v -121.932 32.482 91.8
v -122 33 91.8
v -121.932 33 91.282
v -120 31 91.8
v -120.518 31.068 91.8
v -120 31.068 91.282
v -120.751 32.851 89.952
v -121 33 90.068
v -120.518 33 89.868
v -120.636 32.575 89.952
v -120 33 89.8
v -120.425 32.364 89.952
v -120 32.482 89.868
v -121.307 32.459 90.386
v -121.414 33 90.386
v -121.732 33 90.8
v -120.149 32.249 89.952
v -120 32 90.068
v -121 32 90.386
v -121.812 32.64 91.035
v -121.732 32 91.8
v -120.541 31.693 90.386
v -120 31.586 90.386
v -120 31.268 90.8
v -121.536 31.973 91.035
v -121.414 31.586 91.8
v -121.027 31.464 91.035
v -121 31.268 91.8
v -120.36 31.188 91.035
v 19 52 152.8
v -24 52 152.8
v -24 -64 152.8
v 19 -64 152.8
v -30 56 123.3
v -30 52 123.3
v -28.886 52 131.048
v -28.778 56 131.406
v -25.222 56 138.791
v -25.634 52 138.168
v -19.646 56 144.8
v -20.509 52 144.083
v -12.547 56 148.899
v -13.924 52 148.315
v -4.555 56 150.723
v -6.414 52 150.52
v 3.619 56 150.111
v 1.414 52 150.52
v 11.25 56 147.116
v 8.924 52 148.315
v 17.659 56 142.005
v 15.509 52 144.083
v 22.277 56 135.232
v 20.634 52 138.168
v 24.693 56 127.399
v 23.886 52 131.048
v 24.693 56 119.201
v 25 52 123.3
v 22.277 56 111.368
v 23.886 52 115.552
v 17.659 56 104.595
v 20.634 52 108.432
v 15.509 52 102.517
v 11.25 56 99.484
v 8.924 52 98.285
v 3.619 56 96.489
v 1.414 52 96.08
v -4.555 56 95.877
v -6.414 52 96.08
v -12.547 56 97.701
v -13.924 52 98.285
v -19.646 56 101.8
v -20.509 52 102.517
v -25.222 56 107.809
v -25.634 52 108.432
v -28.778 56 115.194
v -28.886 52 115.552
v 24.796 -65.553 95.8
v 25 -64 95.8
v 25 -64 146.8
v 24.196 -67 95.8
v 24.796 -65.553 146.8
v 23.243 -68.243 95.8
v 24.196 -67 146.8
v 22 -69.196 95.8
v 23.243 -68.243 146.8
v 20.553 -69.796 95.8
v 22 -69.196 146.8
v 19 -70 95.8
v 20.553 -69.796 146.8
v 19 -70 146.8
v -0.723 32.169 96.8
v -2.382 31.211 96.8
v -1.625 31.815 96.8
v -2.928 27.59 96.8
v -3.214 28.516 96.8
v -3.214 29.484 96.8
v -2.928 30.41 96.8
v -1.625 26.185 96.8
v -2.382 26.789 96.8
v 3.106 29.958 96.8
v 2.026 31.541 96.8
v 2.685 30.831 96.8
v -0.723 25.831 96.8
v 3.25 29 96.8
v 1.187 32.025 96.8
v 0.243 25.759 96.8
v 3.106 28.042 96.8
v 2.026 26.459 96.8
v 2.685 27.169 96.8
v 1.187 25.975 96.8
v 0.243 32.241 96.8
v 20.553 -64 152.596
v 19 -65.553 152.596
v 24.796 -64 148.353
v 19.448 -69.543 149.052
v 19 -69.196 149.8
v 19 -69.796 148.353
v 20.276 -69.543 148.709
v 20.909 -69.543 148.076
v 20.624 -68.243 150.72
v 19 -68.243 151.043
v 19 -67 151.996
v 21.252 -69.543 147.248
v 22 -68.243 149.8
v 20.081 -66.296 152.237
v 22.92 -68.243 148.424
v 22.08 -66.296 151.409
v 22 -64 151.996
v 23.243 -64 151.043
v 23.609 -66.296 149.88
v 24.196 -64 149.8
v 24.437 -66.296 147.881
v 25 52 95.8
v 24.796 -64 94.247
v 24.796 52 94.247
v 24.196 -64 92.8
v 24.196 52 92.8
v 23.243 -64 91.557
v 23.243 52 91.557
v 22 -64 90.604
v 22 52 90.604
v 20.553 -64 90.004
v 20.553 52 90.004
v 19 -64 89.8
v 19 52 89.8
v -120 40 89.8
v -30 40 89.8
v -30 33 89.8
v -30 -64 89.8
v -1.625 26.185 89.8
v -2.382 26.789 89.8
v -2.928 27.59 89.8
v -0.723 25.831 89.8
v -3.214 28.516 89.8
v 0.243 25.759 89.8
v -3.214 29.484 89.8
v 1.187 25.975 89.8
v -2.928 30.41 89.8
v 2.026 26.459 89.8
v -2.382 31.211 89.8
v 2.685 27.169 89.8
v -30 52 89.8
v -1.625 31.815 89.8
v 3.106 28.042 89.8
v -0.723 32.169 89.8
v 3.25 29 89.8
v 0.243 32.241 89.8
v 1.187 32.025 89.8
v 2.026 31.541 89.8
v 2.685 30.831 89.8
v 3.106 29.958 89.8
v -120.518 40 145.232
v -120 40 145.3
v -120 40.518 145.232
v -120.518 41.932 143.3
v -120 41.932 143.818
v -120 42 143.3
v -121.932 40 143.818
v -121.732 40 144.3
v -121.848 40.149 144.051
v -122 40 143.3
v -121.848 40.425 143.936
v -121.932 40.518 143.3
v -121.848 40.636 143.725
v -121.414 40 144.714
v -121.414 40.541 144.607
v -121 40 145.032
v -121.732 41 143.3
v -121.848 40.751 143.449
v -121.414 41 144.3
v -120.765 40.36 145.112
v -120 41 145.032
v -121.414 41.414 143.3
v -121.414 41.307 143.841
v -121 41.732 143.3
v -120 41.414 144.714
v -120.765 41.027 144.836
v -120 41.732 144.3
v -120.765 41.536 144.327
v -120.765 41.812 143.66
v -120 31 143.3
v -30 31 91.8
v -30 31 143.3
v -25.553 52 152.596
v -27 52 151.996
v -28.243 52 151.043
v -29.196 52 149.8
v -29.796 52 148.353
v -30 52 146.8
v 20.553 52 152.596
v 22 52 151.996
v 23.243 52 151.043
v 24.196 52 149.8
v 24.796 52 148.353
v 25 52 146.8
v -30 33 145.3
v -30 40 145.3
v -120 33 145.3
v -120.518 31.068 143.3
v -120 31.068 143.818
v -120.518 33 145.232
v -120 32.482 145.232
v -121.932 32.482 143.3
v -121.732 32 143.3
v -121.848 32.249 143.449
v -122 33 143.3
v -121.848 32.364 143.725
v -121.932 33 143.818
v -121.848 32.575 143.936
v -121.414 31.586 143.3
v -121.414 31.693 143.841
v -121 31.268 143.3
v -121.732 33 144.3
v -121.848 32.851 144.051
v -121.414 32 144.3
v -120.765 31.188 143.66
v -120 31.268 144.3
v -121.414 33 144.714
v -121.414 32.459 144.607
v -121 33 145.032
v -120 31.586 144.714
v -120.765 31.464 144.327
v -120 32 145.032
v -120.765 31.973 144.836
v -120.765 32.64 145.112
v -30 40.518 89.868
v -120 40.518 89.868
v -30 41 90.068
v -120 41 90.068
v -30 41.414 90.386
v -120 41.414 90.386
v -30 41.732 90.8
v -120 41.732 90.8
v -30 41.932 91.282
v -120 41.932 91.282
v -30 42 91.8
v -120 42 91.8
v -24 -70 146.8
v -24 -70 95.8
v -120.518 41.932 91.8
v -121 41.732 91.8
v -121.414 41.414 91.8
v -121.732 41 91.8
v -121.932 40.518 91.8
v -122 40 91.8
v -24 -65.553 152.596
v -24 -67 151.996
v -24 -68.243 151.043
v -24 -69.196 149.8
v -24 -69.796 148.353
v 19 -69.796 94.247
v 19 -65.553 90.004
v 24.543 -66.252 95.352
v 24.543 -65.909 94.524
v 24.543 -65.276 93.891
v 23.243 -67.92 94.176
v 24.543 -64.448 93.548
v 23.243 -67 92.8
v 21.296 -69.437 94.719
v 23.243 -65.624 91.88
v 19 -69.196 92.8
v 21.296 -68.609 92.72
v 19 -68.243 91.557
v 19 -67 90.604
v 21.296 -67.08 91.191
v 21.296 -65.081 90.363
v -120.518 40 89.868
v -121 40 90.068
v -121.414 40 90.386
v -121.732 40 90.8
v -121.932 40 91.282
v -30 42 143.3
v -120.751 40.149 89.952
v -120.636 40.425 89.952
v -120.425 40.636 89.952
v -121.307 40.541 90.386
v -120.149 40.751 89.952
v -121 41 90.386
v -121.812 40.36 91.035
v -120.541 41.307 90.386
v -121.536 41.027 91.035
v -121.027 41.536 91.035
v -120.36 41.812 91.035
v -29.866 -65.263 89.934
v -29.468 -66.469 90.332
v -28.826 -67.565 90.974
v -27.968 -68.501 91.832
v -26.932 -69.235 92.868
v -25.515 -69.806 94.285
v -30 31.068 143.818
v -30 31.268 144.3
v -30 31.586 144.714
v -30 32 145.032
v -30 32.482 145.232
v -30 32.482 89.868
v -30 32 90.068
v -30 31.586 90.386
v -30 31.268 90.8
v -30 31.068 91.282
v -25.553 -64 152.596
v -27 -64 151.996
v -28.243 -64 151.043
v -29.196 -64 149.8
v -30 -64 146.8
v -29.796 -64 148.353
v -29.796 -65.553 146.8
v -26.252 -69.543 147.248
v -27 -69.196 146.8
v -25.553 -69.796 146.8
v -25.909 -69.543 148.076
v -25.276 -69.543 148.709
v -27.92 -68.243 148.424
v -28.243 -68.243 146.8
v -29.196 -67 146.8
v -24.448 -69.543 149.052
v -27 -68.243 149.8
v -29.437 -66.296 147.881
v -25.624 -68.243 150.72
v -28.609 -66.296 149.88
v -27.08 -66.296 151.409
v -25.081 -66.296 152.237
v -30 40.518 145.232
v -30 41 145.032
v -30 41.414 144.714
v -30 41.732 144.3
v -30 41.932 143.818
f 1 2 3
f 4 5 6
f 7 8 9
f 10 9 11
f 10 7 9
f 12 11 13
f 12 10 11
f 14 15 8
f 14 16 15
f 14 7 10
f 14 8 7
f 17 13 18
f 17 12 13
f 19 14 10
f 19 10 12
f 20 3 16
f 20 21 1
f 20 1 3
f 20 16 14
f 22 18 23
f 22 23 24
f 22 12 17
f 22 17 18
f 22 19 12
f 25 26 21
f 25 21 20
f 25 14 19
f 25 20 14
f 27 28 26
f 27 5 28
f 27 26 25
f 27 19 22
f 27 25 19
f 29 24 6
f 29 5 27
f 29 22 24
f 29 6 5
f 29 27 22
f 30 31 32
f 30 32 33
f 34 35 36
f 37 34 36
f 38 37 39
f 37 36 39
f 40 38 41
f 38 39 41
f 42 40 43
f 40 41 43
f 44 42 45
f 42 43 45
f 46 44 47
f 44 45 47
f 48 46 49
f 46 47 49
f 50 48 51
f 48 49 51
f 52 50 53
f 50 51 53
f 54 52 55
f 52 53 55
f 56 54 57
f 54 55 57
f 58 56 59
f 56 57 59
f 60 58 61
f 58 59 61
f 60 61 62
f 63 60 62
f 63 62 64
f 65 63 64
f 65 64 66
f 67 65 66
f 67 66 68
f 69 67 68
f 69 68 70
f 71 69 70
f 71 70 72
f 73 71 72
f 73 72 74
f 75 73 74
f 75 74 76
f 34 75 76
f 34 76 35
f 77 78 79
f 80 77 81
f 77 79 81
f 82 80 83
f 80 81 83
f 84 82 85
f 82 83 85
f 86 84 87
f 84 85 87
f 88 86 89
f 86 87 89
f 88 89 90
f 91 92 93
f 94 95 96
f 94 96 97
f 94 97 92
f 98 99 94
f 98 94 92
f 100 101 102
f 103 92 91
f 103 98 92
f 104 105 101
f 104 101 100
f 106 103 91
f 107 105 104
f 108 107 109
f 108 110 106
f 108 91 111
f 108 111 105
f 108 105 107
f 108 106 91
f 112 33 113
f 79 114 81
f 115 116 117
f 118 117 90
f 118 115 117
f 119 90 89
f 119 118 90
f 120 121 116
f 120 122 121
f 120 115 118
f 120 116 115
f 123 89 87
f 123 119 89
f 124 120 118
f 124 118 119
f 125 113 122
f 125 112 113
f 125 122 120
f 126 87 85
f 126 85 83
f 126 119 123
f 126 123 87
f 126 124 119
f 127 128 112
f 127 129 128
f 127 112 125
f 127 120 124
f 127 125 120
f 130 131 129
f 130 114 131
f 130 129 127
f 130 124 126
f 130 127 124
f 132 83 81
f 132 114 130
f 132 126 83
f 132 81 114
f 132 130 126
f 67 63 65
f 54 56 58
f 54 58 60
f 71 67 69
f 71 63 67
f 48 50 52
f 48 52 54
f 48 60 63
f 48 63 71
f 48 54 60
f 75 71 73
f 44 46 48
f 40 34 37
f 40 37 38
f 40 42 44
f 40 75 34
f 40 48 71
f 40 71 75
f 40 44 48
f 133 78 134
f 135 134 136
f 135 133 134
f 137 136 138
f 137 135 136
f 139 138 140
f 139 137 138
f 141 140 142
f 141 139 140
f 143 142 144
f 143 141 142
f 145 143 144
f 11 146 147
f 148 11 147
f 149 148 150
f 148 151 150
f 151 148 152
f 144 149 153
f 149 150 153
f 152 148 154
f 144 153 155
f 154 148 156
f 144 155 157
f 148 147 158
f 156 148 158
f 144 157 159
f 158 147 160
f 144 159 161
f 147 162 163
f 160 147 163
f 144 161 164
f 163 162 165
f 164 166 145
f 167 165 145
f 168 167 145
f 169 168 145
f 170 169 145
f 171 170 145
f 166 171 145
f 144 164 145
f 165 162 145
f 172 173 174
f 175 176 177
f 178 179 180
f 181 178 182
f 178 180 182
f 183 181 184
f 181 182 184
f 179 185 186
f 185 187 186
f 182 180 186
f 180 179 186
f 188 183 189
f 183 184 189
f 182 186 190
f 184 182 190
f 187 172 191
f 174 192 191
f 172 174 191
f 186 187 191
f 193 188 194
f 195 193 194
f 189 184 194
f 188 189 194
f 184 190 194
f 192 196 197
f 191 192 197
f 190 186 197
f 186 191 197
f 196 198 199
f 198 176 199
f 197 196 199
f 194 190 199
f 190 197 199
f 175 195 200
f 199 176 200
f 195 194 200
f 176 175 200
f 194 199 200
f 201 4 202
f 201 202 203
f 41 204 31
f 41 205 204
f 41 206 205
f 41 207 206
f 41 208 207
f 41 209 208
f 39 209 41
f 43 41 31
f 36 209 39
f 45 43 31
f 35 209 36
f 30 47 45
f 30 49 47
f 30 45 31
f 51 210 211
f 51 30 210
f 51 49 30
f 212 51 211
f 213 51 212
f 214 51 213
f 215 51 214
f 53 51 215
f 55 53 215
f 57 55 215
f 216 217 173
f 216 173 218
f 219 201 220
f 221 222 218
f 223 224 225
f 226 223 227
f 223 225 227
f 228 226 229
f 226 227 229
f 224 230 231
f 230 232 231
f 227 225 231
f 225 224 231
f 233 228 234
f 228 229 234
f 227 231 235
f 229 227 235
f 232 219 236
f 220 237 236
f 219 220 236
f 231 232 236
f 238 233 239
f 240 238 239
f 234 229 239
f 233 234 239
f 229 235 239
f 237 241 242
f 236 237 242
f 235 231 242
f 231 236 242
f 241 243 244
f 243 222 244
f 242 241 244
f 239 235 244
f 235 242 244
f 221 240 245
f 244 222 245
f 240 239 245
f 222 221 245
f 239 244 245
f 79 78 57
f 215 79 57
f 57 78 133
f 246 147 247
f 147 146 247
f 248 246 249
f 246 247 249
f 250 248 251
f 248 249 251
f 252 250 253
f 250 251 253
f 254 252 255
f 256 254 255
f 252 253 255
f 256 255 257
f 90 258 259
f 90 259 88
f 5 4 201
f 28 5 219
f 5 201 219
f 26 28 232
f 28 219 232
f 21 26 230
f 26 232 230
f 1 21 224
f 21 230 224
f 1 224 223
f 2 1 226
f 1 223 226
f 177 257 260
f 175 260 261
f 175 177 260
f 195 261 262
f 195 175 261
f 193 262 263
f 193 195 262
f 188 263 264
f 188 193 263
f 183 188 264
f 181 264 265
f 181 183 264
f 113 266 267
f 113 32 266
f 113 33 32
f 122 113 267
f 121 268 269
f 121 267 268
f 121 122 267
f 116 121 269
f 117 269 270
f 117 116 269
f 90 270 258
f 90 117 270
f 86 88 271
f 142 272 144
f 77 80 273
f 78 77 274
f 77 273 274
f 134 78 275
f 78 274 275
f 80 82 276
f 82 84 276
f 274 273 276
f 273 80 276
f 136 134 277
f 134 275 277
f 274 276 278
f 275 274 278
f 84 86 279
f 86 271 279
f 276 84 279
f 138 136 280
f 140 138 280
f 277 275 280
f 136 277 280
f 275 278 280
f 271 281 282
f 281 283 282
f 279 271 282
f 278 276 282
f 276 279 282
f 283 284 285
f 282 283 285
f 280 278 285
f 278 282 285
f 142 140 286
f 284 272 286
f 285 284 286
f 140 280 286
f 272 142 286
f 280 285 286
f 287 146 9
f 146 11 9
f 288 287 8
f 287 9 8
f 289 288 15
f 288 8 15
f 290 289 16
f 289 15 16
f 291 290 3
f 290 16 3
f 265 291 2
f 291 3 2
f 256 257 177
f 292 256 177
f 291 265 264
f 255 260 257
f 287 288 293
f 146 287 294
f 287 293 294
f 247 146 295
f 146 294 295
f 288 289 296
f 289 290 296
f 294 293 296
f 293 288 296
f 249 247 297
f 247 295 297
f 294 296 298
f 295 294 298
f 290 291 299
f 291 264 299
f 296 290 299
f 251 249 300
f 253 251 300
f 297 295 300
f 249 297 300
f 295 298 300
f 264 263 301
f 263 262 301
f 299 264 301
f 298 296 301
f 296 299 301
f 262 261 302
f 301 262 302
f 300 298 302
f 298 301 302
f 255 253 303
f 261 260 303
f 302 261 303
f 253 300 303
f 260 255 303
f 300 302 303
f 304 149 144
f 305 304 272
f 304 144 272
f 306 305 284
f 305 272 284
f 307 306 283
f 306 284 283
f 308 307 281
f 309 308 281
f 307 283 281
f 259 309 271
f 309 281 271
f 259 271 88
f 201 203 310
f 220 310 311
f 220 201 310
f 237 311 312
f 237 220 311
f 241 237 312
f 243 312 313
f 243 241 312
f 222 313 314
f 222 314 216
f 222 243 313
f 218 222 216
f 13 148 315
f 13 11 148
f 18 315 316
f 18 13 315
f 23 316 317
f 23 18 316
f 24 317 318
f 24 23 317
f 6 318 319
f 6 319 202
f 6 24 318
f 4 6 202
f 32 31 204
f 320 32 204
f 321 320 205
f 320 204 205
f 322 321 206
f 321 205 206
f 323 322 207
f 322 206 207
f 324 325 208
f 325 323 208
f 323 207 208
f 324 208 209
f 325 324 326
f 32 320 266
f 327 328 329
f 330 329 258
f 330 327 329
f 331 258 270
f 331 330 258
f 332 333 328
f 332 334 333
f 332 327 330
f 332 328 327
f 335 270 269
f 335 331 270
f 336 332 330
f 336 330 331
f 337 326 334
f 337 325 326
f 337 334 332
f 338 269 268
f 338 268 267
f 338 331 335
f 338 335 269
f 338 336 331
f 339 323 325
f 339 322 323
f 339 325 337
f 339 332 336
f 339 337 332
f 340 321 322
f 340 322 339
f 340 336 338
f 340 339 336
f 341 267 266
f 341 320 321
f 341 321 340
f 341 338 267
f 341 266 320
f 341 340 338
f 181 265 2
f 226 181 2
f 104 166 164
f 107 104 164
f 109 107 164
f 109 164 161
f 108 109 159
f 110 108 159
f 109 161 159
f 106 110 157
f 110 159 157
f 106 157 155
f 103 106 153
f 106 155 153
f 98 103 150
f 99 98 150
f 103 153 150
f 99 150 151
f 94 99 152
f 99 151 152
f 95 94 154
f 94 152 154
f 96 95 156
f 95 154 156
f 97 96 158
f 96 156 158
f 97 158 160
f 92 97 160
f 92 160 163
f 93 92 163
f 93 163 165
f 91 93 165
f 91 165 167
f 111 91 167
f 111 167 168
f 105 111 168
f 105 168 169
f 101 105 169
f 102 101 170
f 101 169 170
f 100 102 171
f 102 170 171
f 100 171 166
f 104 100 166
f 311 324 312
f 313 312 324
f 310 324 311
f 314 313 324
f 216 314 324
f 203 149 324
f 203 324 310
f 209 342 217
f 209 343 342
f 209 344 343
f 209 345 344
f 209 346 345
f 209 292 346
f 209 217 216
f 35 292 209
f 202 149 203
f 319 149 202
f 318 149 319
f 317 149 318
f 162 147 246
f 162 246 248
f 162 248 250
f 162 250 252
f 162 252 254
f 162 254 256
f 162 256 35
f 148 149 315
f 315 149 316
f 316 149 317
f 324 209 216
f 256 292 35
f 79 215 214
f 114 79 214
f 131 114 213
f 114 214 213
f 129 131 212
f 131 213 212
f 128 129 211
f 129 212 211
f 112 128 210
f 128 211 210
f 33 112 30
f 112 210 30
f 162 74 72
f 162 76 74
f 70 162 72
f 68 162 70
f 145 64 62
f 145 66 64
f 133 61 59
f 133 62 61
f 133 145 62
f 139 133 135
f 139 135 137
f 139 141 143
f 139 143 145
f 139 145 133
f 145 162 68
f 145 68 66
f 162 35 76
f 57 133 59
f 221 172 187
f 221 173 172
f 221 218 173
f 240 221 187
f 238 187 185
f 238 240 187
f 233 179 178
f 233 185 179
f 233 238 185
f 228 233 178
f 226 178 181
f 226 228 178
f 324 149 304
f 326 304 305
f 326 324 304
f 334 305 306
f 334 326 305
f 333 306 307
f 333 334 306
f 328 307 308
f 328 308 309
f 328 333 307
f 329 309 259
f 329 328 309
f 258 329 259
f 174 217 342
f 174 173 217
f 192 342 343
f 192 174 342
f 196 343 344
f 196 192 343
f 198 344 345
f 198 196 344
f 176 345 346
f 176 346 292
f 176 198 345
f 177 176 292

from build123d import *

# Parameters (mm, degrees)
SKETCH068_W     = 55
SKETCH068_H     = 122
PAD033_DEPTH    = 63
SKETCH069_R     = 27.5
PAD034_DEPTH    = 4
SKETCH070_R     = 3.25
POCKET026_DEPTH = 7
SKETCH071_W     = 11
SKETCH071_H     = 55.5
PAD035_DEPTH    = 92
FILLET_R        = 6
FILLET001_R     = 2


with BuildPart() as part:
    # Sketch068 (on Face5 of ShapeBinder026) → Pad033 (new body)
    with BuildSketch(Plane.XY.offset(89.8)):
        with Locations((-2.5, -9)):
            Rectangle(SKETCH068_W, SKETCH068_H)
    extrude(amount=PAD033_DEPTH)

    # Sketch069 (on Face1 of Pad033) → Pad034 (join)
    with BuildSketch(Plane(origin=(0, 52, -4), x_dir=(-1, 0, 0), z_dir=(0, 1, 0))):
        with Locations((2.5, 127.3)):
            Circle(SKETCH069_R)
    extrude(amount=PAD034_DEPTH)

    # Sketch070 (on Face5 of Pad033) → Pocket026 (cut)
    with BuildSketch(Plane(origin=(0, 0, 89.8), x_dir=(1, 0, 0), z_dir=(0, 0, -1))):
        with Locations((0, -29)):
            Circle(SKETCH070_R)
    extrude(amount=-POCKET026_DEPTH, mode=Mode.SUBTRACT)

    # Sketch071 (on Face4 of Pad033) → Pad035 (join)
    with BuildSketch(Plane(origin=(-30, 0, -4), x_dir=(0, -1, 0), z_dir=(-1, 0, 0))):
        with Locations((-36.5, 121.55)):
            Rectangle(SKETCH071_W, SKETCH071_H)
    extrude(amount=PAD035_DEPTH)

    # Fillet
    fillet_edges = [part.edges().sort_by_distance(p)[0] for p in [
        (-30, -9, 152.8),
        (-30, -70, 121.3),
        (-2.5, -70, 89.8),
        (25, -9, 152.8),
        (-2.5, -70, 152.8),
        (25, -70, 121.3),
        (25, -9, 89.8),
    ]]
    fillet(fillet_edges, radius=FILLET_R)

    # Fillet001
    fillet001_edges = [part.edges().sort_by_distance(p)[0] for p in [
        (-76, 31, 145.3),
        (-122, 31, 117.55),
        (-76, 42, 145.3),
        (-122, 36.5, 145.3),
        (-122, 42, 117.55),
        (-122, 36.5, 89.8),
        (-76, 42, 89.8),
        (-76, 31, 89.8),
    ]]
    fillet(fillet001_edges, radius=FILLET001_R)


solid = part.part
